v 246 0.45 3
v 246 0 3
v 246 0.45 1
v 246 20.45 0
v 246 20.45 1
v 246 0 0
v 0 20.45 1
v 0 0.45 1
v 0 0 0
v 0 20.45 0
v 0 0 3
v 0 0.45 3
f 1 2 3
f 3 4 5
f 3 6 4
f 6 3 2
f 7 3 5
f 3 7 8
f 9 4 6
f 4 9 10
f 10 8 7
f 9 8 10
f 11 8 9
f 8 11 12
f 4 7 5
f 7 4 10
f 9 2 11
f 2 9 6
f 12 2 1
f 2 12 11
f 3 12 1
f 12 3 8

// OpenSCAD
//shelf trim


l = 246;
h = 20;
d = 1;
overlap_h = 0.45;
overlap_d = 2;


cube([l, h + overlap_h, d]);
cube([l, overlap_h, overlap_d + d]);
